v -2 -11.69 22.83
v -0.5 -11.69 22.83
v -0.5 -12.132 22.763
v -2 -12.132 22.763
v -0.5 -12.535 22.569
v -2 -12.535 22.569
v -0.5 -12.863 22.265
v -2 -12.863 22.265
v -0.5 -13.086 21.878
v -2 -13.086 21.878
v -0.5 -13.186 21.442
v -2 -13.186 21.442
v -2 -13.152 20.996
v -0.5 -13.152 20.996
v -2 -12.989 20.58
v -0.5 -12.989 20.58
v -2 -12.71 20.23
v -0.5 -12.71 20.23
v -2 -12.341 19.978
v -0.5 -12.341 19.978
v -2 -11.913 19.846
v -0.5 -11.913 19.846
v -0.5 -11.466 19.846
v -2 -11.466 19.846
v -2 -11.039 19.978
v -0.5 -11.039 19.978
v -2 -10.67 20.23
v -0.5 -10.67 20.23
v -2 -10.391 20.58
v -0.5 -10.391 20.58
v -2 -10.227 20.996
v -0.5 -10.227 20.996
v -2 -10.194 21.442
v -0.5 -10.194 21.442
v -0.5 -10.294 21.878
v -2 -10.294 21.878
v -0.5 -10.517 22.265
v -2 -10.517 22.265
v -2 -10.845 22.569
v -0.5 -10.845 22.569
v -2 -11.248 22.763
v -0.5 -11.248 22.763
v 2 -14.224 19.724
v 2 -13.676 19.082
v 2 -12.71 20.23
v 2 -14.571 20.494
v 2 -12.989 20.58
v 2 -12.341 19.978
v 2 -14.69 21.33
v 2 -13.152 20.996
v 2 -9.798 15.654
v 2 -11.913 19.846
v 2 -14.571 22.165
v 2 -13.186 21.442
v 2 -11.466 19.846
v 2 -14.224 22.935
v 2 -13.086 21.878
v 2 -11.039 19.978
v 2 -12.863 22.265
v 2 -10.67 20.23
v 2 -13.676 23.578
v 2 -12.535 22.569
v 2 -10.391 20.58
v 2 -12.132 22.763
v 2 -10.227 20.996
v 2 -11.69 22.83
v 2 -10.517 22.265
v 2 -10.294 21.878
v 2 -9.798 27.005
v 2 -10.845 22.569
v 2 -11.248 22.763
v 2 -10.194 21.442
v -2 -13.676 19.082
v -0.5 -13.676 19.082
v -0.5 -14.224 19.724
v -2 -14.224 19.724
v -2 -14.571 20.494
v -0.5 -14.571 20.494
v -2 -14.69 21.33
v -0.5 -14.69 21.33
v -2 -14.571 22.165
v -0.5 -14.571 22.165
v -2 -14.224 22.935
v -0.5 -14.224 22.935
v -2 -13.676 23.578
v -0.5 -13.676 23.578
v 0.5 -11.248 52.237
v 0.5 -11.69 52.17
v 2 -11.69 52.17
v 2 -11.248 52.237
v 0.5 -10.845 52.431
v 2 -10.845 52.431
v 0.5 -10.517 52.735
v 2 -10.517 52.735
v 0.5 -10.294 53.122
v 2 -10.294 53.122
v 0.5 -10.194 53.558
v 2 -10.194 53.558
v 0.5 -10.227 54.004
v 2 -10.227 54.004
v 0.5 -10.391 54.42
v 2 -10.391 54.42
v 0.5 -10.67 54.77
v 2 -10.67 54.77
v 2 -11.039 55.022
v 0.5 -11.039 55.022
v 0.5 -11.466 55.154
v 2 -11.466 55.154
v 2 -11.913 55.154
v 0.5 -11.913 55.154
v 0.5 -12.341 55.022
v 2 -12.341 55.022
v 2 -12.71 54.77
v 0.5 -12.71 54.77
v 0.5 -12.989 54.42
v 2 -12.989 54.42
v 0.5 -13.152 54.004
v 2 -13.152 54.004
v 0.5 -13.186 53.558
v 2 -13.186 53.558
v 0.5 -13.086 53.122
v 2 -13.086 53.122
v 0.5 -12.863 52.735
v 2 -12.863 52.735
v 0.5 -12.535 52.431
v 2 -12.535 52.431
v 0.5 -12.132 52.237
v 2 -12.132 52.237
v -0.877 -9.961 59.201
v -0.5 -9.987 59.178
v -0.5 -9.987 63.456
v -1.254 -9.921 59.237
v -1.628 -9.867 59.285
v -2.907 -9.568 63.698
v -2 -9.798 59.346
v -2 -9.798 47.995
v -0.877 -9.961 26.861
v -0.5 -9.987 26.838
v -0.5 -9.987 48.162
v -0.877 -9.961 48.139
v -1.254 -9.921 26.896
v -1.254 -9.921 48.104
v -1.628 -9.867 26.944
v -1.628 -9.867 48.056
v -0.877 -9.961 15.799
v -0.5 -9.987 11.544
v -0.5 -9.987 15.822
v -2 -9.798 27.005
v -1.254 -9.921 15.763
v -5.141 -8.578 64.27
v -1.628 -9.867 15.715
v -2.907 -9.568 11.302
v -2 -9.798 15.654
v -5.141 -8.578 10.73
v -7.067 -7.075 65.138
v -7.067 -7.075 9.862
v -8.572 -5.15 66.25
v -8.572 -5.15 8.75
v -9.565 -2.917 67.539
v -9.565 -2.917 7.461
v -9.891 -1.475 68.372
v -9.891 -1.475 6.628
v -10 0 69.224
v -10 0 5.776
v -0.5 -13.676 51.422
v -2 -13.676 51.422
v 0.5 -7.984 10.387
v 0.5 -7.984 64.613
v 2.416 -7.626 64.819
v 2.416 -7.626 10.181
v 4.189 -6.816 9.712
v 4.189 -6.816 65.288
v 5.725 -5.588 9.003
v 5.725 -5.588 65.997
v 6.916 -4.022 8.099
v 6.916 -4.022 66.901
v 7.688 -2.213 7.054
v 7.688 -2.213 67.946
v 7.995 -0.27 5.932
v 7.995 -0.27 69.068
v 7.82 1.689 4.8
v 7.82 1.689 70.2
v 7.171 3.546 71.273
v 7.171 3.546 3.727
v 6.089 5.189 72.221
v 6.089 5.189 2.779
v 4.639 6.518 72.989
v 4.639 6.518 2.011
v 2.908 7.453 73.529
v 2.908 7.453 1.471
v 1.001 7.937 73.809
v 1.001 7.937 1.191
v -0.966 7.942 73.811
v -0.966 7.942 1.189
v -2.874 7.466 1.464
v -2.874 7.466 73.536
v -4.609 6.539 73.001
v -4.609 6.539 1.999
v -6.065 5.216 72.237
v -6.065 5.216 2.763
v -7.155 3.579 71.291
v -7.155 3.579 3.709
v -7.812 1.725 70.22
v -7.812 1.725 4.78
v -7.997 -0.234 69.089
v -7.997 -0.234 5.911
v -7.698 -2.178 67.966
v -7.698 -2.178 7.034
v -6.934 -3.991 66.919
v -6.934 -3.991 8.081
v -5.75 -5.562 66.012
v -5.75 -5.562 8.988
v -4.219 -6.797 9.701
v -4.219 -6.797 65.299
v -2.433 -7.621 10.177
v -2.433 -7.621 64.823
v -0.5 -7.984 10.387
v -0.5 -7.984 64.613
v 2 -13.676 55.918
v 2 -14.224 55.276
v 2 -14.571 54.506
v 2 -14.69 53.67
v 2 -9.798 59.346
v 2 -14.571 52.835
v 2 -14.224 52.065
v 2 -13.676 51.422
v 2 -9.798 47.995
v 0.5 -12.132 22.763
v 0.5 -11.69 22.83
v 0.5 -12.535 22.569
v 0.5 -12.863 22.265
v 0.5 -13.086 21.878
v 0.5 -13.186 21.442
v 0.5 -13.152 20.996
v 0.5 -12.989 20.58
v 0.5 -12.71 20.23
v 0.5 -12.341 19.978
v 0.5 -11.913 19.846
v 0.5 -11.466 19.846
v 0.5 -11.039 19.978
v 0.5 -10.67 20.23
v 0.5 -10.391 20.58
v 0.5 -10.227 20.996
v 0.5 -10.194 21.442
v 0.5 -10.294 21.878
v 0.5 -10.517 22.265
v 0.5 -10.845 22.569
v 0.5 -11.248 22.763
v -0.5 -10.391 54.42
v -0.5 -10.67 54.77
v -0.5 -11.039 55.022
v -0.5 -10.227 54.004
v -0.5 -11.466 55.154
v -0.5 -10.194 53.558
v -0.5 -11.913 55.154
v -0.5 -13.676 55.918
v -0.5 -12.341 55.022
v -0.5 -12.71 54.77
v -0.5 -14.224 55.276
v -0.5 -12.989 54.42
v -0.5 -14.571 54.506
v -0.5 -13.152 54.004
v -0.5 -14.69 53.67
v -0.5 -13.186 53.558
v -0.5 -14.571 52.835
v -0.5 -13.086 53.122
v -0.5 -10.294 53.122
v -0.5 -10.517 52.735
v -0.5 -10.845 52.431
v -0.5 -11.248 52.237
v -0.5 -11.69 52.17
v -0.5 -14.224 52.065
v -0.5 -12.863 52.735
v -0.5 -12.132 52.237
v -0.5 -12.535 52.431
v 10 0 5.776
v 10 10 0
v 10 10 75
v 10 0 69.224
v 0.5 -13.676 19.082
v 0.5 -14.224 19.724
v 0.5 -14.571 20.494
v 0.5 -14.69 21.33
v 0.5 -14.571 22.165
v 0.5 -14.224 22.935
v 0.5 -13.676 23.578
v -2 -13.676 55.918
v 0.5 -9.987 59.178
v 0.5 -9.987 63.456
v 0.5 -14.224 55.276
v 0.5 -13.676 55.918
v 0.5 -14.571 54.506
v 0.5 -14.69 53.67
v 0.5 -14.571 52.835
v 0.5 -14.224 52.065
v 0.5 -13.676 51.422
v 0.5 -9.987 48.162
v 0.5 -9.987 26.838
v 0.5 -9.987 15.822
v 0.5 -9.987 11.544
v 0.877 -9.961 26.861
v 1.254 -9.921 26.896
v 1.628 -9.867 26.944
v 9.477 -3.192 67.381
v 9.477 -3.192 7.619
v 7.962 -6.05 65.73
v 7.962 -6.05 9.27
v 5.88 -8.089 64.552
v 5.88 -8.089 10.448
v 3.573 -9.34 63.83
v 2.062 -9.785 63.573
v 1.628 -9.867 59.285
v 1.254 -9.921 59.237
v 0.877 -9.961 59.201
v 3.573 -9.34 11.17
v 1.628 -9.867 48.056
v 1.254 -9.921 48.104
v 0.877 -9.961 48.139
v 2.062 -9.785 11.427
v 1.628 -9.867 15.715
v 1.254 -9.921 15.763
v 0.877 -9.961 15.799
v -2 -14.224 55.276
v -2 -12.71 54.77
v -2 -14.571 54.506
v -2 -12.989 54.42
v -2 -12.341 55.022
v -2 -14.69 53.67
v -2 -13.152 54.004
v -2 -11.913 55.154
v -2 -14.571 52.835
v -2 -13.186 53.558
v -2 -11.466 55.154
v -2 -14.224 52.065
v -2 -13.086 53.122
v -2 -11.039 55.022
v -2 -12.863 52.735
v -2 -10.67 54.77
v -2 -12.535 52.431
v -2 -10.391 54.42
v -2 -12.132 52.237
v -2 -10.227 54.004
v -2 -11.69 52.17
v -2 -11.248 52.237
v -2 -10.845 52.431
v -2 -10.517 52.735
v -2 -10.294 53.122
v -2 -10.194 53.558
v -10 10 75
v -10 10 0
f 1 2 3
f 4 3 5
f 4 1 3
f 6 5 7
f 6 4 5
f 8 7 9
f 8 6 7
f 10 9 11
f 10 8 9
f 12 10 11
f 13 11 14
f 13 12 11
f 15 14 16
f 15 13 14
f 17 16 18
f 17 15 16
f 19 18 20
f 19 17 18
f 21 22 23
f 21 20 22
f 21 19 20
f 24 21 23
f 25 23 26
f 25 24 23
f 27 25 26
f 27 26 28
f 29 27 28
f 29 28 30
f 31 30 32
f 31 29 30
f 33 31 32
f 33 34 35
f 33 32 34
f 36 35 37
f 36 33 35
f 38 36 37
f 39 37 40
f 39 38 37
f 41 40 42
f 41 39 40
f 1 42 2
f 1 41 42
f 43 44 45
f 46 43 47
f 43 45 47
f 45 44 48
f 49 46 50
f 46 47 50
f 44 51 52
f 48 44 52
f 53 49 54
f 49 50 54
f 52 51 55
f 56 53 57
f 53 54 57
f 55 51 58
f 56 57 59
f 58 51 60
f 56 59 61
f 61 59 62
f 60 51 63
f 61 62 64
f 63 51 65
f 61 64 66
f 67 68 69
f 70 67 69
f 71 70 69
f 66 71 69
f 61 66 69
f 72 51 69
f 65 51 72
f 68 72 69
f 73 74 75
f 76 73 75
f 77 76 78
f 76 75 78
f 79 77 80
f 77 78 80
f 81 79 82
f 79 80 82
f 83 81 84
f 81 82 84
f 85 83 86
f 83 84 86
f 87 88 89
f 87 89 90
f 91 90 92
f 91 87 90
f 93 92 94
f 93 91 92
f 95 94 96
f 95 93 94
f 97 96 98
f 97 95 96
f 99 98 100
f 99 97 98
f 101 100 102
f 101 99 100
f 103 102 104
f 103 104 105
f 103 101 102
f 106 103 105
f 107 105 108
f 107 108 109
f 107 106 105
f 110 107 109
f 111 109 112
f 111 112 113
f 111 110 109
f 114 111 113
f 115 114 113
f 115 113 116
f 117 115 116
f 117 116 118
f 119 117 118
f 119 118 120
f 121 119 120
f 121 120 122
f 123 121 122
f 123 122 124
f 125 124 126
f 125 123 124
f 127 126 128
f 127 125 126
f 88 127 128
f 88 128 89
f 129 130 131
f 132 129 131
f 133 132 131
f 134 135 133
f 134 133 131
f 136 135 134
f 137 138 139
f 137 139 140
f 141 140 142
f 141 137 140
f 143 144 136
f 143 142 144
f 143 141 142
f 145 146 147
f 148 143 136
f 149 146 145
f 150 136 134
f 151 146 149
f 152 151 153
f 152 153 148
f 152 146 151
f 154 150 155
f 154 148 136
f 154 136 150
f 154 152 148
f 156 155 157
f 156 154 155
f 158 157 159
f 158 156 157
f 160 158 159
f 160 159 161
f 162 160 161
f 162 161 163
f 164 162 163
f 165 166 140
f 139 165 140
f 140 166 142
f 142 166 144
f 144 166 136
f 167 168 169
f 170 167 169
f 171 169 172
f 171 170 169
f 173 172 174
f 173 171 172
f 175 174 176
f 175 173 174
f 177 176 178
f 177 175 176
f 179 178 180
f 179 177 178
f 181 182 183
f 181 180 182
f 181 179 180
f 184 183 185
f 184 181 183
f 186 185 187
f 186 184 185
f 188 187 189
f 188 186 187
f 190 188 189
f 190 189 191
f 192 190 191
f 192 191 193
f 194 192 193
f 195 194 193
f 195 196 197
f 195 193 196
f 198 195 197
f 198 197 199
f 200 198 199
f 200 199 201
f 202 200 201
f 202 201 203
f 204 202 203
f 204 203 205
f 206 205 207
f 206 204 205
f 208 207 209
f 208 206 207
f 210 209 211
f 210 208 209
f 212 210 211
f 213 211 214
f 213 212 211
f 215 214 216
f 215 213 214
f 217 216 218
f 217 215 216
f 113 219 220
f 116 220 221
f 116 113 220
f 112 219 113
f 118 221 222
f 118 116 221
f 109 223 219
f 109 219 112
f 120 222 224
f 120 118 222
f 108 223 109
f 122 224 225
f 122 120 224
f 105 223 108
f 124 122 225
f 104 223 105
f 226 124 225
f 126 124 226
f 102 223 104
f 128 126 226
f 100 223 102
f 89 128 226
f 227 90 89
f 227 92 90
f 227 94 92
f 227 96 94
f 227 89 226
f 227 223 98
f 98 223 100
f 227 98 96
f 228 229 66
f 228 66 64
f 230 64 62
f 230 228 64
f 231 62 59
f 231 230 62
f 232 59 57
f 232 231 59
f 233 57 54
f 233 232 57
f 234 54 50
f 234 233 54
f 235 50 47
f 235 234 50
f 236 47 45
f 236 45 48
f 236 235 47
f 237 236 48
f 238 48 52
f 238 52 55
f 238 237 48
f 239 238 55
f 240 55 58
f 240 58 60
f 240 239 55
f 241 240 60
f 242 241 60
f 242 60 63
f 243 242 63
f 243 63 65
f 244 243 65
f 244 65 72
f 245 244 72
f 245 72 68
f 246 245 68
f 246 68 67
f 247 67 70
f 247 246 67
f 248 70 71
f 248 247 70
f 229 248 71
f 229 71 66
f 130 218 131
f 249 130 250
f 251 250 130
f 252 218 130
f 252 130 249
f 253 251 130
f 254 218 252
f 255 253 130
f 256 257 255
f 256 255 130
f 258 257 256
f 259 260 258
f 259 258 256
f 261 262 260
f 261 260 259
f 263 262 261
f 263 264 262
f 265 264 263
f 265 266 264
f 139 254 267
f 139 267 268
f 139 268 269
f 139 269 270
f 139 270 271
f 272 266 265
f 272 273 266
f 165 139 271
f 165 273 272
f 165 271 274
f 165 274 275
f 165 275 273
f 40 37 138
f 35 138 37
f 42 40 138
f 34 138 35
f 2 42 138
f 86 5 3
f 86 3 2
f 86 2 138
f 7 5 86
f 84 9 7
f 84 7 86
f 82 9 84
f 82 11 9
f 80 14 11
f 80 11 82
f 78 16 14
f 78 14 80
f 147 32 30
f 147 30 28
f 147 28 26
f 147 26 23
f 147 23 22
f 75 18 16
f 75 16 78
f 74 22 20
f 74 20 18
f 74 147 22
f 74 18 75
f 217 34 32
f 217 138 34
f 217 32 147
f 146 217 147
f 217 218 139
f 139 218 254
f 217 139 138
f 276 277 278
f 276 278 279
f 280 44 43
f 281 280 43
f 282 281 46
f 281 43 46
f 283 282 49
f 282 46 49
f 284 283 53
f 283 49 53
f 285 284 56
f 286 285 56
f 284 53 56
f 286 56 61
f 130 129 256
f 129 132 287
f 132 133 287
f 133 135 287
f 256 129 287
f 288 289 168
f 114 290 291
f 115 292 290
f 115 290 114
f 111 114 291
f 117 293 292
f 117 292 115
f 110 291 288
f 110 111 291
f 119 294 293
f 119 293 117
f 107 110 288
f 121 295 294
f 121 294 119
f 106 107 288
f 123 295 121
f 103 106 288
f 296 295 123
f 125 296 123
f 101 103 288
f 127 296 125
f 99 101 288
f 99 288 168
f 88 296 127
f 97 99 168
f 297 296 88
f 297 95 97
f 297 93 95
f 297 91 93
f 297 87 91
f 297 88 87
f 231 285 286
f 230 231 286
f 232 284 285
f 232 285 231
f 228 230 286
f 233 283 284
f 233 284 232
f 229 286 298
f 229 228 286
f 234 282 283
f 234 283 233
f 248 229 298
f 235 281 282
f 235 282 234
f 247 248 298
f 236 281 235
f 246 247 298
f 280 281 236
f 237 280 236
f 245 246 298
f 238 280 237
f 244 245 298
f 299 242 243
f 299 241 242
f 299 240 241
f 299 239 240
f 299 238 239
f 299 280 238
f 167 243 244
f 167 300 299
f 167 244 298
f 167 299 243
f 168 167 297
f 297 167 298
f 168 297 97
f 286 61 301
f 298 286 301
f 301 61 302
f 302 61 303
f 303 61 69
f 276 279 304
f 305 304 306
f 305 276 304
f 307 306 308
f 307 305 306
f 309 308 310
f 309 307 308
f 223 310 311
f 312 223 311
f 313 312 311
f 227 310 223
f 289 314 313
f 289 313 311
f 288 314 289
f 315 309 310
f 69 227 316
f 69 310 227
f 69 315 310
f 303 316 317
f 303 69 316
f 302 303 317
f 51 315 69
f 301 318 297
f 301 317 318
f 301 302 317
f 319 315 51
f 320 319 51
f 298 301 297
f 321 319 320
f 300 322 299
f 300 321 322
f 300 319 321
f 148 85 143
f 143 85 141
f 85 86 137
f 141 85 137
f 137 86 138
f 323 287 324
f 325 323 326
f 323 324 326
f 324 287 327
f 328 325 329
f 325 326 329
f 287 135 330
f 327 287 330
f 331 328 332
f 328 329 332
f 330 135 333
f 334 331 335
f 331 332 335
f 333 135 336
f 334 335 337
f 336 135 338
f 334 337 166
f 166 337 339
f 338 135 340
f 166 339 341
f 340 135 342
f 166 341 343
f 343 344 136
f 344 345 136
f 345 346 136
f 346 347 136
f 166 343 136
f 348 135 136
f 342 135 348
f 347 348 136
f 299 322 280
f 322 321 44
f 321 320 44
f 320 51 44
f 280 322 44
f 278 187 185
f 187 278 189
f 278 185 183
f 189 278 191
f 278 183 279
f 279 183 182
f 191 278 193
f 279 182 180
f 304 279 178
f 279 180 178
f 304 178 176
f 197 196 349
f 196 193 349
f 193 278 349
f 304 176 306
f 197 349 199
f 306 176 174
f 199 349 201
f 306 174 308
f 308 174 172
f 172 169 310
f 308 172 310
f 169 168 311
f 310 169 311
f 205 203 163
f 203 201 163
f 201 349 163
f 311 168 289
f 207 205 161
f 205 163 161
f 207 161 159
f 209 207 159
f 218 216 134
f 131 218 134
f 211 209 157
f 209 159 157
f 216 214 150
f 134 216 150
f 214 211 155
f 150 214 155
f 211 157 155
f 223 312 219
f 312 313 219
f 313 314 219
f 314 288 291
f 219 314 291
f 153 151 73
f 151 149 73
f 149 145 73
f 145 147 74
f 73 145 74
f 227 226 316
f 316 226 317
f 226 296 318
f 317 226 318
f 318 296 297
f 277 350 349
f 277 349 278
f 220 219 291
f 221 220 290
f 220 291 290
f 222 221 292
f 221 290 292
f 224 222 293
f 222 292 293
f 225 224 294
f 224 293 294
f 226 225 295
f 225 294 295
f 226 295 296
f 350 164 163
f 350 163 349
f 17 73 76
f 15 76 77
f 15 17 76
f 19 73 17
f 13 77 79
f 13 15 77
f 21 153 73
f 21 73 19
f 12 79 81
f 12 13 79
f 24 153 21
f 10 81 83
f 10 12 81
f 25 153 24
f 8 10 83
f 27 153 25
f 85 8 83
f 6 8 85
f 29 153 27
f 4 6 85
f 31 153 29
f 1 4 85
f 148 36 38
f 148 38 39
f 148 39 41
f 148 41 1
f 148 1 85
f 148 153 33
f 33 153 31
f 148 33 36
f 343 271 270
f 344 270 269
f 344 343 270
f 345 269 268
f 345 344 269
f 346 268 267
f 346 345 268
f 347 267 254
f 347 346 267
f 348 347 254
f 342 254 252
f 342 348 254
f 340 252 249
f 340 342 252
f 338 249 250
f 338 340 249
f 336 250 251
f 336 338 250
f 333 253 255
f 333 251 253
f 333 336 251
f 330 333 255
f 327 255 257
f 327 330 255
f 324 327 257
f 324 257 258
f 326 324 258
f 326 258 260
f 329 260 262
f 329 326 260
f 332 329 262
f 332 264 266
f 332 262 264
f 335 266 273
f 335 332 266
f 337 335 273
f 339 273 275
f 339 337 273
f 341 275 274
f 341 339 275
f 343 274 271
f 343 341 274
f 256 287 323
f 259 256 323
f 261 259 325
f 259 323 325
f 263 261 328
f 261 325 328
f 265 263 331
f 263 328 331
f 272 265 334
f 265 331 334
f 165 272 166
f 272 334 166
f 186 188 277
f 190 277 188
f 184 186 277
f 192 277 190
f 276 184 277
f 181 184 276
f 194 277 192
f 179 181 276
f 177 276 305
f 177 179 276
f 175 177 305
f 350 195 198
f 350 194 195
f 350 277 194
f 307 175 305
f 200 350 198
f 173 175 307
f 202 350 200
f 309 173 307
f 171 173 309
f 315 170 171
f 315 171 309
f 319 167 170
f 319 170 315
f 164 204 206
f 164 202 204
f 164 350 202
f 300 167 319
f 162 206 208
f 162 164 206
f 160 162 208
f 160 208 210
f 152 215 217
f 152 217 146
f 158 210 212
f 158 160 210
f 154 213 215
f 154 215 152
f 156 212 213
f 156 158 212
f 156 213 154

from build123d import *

# Parameters (mm, degrees)
SALIENTE_EXTRUIR1_DEPTH    = 75
CROQUIS2_R                 = 1.5
SALIENTE_EXTRUIR2_DEPTH    = 2
CORTAR_EXTRUIR1_DEPTH      = 78.076531881
CORTAR_EXTRUIR1_DEPTH_BACK = 78.076531881
CROQUIS5_W                 = 1
CROQUIS5_H                 = 6.705492802
CORTAR_EXTRUIR2_DEPTH      = 78.076531881
CORTAR_EXTRUIR2_DEPTH_BACK = 78.076531881


with BuildPart() as part:
    # Croquis1 → Saliente-Extruir1 (new body)
    with BuildSketch(Plane.XY):
        with BuildLine():
            Line((-10, 10), (10, 10))
            Line((10, 10), (10, 0))
            ThreePointArc((10, 0), (7.245688373, -6.892024376), (0.5, -9.987492178))
            Line((0.5, -9.987492178), (0.5, -7.984359711))
            ThreePointArc((0.5, -7.984359711), (0, 8), (-0.5, -7.984359711))
            Line((-0.5, -7.984359711), (-0.5, -9.987492178))
            ThreePointArc((-0.5, -9.987492178), (-7.245688373, -6.892024376), (-10, 0))
            Line((-10, 0), (-10, 10))
        make_face()
    extrude(amount=SALIENTE_EXTRUIR1_DEPTH)

    # Croquis2 → Saliente-Extruir2 (add, symmetric)
    # profile 1 of 2: a face of its own
    with BuildSketch(Plane(origin=(0, 0, 0), x_dir=(0, 0, -1), z_dir=(1, 0, 0))):
        with BuildLine():
            Line((-60, -9.057857597), (-55.918368417, -13.676465368))
            ThreePointArc((-55.918368417, -13.676465368), (-53.670398363, -14.689852513), (-51.422428309, -13.676465368))
            Line((-51.422428309, -13.676465368), (-47.340796726, -9.057857597))
            Line((-47.340796726, -9.057857597), (-60, -9.057857597))
        make_face()
        with Locations((-53.670398363, -11.689852513)):
            Circle(CROQUIS2_R, mode=Mode.SUBTRACT)
    # profile 2 of 2: a face of its own
    with BuildSketch(Plane(origin=(0, 0, 0), x_dir=(0, 0, -1), z_dir=(1, 0, 0))):
        with BuildLine():
            Line((-15, -9.057857597), (-19.081631583, -13.676465368))
            ThreePointArc((-19.081631583, -13.676465368), (-21.329601637, -14.689852513), (-23.577571691, -13.676465368))
            Line((-23.577571691, -13.676465368), (-27.659203274, -9.057857597))
            Line((-27.659203274, -9.057857597), (-15, -9.057857597))
        make_face()
        with Locations(Location((-21.329601637, -11.689852513, 0), (0, 0, 180))):
            Circle(CROQUIS2_R, mode=Mode.SUBTRACT)
    extrude(amount=SALIENTE_EXTRUIR2_DEPTH, both=True)

    # Croquis5 → Cortar-Extruir1 (cut, two sides: drawn at the far end of the back side and taken through both)
    with BuildSketch(Plane.XY.offset(-CORTAR_EXTRUIR1_DEPTH_BACK)):
        with Locations((0, -11.337106112)):
            Rectangle(CROQUIS5_W, CROQUIS5_H)
    extrude(amount=CORTAR_EXTRUIR1_DEPTH + CORTAR_EXTRUIR1_DEPTH_BACK, mode=Mode.SUBTRACT)

    # Croquis6 → Cortar-Extruir2 (cut, two sides: drawn at the far end of the back side and taken through both)
    with BuildSketch(Plane(origin=(0, 0, 0), x_dir=(0, 0, -1), z_dir=(1, 0, 0)).offset(-CORTAR_EXTRUIR2_DEPTH_BACK)):
        Polygon((-75, 10), (-63.455743468, -9.987492178), (-75, -9.987492178), align=None)
        Polygon((-11.544256532, -9.987492178), (0, -9.987492178), (0, 10), align=None)
    extrude(amount=CORTAR_EXTRUIR2_DEPTH + CORTAR_EXTRUIR2_DEPTH_BACK, mode=Mode.SUBTRACT)


solid = part.part
